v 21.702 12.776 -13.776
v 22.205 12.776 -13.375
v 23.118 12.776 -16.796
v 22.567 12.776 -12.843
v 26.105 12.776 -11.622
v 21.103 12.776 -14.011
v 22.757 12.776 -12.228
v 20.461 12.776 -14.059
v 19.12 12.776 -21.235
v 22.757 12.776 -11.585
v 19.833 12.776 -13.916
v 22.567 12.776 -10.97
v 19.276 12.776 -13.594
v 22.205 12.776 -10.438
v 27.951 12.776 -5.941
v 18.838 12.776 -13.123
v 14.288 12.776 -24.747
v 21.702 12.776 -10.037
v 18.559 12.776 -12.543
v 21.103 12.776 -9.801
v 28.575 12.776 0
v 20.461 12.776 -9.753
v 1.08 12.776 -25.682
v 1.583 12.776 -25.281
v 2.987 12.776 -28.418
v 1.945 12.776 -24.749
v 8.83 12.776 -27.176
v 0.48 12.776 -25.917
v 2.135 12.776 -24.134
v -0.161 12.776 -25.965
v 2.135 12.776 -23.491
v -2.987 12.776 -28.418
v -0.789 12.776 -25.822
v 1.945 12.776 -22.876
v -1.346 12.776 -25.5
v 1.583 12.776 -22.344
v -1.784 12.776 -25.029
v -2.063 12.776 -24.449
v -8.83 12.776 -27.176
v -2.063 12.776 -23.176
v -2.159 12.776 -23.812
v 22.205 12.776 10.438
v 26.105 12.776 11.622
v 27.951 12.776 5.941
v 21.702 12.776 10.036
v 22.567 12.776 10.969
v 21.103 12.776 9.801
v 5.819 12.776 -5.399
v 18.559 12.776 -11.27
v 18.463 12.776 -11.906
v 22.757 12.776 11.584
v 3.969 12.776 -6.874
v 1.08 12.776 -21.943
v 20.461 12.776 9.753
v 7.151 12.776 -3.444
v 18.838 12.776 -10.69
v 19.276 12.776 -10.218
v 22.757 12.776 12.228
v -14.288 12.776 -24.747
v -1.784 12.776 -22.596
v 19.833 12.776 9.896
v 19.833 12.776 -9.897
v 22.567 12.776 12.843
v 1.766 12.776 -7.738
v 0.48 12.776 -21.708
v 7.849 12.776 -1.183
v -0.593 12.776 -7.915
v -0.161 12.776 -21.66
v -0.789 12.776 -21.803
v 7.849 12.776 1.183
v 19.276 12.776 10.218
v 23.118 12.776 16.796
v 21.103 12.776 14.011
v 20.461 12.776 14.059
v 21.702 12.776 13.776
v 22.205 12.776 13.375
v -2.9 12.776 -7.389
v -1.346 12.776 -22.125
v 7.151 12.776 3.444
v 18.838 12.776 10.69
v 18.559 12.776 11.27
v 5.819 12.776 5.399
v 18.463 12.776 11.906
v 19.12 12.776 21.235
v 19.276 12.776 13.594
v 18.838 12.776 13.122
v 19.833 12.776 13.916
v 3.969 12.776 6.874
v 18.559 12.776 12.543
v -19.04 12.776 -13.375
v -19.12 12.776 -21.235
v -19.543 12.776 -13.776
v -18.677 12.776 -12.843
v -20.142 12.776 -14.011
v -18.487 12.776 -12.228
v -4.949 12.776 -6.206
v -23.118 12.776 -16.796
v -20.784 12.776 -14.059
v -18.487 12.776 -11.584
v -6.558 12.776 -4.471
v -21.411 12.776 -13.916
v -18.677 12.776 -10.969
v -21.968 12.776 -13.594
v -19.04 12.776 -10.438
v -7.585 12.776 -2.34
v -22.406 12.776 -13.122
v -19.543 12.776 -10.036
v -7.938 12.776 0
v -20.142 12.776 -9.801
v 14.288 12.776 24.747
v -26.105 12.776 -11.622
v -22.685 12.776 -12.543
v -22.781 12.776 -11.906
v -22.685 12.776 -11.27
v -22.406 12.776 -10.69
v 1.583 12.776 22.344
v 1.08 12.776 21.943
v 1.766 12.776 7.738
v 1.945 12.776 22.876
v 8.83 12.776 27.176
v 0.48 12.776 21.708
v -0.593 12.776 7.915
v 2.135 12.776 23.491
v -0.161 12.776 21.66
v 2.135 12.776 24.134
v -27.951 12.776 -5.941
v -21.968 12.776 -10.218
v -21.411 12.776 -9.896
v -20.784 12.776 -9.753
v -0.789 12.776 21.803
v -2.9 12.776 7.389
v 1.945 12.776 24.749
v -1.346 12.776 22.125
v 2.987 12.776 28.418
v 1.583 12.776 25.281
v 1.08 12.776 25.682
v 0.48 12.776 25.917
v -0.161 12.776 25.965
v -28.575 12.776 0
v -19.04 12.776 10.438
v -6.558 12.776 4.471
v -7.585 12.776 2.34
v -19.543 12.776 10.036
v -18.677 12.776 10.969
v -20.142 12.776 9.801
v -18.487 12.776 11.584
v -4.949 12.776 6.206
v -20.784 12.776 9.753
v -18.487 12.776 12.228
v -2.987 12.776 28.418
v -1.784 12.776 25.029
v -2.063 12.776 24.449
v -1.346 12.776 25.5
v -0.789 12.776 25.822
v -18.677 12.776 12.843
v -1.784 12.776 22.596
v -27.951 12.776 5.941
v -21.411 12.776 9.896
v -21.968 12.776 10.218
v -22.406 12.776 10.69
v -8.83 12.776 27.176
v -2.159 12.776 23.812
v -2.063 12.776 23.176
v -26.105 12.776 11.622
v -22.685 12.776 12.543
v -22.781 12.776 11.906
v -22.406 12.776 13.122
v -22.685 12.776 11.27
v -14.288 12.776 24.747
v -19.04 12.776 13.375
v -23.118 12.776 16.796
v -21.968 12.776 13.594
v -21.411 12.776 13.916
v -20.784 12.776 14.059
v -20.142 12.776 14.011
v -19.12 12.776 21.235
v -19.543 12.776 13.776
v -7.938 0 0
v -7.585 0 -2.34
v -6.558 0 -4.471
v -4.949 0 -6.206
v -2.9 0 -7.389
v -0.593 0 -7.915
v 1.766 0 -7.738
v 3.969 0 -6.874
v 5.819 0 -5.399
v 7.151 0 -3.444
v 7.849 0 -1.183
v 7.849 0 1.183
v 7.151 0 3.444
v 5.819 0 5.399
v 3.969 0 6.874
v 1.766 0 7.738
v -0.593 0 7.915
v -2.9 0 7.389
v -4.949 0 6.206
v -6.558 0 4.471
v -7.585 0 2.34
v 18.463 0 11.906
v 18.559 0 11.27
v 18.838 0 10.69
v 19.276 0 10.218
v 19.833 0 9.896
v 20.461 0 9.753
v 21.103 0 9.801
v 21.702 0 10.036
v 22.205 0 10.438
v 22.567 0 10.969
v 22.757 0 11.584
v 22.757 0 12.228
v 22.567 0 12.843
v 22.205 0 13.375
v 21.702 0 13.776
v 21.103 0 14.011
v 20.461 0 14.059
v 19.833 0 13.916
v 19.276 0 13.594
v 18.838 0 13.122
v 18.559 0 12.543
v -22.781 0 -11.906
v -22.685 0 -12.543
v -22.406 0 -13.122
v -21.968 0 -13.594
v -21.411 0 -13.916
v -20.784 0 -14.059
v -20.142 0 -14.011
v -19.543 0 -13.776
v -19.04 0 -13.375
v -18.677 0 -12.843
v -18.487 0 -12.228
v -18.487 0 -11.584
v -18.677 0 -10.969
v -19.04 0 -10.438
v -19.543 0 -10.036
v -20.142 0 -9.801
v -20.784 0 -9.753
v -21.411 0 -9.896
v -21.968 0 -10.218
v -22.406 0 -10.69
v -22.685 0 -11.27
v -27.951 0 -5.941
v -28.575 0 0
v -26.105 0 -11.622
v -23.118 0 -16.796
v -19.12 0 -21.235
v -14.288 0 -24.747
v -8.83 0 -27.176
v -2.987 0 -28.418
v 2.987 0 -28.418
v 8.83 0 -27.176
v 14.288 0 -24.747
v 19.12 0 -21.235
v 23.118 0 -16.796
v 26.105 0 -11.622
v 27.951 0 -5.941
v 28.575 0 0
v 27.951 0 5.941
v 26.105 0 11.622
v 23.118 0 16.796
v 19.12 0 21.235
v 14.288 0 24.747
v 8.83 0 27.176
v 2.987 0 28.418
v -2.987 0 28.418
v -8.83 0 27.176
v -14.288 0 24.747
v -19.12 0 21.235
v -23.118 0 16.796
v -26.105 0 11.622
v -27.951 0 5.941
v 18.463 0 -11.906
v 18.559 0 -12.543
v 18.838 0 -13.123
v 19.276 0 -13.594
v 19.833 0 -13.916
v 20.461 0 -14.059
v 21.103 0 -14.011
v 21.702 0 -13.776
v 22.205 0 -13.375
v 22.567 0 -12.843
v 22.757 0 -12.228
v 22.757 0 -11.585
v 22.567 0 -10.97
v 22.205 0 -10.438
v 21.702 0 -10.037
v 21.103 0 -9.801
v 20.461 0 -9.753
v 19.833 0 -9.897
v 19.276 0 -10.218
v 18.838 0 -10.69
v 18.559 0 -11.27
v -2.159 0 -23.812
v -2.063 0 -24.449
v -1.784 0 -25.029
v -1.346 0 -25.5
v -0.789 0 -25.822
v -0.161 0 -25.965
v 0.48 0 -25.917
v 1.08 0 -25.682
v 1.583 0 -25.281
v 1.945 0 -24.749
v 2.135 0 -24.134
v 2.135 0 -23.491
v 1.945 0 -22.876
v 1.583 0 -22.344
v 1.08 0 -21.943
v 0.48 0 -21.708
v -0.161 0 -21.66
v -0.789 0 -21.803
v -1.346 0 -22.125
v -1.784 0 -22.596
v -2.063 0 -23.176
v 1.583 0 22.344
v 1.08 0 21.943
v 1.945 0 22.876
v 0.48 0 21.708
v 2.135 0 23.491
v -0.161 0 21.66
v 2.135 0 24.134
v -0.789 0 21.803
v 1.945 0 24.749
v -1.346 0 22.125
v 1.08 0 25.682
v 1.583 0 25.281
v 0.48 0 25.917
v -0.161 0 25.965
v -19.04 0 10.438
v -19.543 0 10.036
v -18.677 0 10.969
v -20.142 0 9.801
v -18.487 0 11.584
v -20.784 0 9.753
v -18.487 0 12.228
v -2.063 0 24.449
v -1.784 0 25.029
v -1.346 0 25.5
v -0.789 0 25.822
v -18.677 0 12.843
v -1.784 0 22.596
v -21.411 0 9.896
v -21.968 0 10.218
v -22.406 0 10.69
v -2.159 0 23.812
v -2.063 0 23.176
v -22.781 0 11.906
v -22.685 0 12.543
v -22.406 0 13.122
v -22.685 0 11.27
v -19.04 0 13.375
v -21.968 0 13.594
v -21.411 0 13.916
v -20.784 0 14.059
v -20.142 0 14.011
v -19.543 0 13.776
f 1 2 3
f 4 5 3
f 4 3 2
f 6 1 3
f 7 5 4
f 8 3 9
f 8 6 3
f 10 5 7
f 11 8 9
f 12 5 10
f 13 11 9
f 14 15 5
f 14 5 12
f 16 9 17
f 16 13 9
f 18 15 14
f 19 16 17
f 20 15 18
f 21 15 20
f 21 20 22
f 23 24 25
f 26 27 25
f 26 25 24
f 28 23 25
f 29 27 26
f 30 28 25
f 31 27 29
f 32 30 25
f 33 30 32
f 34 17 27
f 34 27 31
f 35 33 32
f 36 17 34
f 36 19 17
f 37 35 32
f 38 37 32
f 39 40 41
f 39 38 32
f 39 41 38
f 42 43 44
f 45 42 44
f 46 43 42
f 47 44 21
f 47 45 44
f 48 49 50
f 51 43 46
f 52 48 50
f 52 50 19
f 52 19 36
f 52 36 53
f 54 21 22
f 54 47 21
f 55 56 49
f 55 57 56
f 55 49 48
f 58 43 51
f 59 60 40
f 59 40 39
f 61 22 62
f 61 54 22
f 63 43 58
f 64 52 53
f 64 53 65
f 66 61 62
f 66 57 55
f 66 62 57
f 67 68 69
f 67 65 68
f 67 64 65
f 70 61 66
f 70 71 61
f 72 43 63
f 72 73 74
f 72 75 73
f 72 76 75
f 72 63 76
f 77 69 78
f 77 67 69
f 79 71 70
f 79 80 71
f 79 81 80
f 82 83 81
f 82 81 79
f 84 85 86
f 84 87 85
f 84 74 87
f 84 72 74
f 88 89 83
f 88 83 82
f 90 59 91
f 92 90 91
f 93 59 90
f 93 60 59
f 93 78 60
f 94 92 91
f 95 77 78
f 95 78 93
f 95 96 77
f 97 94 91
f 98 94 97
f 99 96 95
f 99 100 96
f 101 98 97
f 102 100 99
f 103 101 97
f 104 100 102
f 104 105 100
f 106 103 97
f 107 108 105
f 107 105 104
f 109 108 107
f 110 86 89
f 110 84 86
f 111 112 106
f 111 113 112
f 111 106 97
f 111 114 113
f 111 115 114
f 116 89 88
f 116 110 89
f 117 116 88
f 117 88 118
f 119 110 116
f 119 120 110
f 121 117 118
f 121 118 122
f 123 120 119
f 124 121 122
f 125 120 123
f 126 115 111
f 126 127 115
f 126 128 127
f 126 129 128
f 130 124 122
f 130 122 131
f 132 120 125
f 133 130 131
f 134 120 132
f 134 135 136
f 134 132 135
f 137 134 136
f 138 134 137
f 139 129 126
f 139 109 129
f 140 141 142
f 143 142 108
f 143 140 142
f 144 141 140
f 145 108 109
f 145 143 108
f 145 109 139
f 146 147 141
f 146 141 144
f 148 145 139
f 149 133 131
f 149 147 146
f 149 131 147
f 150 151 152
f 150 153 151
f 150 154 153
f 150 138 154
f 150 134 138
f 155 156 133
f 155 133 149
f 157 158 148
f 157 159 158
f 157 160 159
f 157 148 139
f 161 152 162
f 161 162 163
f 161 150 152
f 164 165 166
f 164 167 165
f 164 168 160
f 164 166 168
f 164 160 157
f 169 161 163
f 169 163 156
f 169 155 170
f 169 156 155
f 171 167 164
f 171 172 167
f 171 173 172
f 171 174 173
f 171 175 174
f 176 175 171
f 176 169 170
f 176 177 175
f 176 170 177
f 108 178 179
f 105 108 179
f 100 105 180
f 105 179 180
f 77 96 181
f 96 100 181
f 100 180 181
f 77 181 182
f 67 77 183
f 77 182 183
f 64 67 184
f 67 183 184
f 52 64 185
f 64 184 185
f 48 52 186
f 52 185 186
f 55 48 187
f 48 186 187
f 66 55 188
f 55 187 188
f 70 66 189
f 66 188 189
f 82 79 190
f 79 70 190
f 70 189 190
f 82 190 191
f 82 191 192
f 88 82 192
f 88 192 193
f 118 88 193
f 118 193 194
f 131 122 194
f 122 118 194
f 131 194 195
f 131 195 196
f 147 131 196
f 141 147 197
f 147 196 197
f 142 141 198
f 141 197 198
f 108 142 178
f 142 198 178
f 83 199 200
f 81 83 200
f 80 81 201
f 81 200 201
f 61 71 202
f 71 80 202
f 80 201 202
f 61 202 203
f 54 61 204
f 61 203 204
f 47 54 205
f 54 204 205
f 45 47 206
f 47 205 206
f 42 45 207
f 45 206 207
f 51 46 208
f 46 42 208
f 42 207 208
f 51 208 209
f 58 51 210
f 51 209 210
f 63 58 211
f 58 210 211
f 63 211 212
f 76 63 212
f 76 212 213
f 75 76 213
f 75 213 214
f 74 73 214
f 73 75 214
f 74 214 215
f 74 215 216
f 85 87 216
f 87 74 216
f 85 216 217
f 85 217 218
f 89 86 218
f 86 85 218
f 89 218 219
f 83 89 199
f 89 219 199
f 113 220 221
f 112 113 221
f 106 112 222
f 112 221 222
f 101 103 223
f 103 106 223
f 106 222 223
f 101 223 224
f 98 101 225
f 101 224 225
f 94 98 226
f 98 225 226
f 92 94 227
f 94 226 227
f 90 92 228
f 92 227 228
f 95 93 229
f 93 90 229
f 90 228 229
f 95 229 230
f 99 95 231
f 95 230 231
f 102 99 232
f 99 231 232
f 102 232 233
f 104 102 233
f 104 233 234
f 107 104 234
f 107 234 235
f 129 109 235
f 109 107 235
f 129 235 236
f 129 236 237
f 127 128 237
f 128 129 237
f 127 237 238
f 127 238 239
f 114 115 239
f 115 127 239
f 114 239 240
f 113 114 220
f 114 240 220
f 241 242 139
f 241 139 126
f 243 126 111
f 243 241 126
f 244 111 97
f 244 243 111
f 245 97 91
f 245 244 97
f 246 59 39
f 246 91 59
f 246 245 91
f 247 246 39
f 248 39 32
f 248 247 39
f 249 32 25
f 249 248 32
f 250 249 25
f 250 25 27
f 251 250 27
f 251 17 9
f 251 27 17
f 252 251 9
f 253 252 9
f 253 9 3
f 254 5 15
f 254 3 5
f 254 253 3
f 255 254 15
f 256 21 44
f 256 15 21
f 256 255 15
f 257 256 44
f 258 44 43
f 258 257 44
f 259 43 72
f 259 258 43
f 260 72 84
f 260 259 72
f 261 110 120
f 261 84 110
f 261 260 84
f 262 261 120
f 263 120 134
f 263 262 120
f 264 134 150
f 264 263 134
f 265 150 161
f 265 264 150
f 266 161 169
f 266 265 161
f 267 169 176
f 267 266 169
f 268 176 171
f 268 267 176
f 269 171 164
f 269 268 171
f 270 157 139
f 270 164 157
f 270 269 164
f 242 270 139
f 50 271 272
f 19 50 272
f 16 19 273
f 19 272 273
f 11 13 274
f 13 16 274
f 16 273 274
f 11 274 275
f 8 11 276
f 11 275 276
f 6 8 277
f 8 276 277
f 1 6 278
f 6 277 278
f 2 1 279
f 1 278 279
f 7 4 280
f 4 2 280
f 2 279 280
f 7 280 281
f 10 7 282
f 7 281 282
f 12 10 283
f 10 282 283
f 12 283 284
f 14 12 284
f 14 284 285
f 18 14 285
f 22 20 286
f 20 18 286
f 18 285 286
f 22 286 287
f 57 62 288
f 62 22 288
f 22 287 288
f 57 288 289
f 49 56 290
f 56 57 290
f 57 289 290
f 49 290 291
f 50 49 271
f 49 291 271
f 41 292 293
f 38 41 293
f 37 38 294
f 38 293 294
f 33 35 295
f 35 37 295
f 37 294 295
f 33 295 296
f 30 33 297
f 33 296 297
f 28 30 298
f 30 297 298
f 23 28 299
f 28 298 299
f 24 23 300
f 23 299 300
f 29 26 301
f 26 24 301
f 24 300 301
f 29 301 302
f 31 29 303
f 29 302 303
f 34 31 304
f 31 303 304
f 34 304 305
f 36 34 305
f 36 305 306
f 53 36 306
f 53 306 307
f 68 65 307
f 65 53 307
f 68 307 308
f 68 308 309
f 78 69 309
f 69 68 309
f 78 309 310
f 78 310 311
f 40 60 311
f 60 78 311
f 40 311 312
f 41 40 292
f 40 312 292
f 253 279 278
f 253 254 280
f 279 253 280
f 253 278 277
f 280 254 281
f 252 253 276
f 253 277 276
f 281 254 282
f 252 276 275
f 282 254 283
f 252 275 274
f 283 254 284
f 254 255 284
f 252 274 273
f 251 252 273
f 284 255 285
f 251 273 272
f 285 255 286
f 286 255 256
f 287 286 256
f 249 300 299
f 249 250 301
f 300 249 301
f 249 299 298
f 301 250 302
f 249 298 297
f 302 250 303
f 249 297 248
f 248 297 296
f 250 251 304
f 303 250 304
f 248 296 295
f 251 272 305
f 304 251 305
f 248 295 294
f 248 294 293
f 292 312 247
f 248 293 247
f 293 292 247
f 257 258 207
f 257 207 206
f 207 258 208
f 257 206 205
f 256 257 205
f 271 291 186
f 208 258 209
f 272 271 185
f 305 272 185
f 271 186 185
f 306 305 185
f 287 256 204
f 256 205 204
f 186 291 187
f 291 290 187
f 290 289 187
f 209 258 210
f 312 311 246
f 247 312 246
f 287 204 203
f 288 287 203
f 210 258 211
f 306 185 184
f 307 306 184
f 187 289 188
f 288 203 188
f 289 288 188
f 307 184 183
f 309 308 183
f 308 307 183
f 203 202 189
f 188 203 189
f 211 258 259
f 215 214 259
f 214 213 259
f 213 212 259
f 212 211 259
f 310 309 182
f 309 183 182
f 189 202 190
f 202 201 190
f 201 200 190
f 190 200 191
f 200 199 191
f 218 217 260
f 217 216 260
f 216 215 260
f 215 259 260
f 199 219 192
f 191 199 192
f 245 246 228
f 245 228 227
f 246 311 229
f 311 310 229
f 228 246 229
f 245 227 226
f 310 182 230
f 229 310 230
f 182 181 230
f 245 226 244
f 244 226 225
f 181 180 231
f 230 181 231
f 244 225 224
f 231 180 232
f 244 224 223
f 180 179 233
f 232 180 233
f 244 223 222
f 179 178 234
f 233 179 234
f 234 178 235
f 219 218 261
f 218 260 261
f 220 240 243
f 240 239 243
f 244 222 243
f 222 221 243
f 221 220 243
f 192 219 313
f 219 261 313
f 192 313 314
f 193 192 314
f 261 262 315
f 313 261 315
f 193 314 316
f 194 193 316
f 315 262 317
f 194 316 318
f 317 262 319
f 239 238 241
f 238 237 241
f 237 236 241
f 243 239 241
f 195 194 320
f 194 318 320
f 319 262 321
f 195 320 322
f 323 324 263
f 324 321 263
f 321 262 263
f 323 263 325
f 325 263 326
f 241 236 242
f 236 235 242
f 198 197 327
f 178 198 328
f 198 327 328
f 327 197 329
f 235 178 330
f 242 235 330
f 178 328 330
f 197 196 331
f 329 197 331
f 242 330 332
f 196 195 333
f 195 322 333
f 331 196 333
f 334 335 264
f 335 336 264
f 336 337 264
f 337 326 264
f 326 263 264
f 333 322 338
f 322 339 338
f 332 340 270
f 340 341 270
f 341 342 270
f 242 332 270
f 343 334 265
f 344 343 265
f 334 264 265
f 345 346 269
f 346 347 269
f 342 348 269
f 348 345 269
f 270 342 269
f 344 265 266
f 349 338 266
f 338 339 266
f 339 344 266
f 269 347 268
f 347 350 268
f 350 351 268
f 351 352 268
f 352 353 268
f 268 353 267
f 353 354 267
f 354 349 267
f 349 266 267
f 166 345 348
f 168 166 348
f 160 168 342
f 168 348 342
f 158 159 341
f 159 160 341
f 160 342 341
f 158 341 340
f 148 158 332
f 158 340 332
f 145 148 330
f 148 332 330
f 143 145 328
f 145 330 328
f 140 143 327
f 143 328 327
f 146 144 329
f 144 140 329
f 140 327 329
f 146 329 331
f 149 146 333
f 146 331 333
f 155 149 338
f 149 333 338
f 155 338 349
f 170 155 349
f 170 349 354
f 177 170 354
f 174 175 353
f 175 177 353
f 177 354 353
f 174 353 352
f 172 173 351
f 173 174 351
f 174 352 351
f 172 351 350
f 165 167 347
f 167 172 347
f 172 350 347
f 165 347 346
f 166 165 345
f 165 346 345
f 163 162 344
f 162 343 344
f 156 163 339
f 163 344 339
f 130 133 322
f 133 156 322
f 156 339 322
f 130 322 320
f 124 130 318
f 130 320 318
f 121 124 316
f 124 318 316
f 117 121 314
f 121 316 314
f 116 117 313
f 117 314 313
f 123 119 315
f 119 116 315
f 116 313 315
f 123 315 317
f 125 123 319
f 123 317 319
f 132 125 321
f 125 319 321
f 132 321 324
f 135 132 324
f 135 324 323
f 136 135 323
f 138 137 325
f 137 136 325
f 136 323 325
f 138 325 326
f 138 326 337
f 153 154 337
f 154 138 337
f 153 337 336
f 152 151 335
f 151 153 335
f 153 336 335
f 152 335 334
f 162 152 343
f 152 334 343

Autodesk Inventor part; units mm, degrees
ref_plane "YZ Plane" through (0, 0, 0) normal (1, 0, 0) x (0, 1, 0)
ref_plane "XZ Plane" through (0, 0, 0) normal (0, 1, 0) x (-1, 0, 0)
ref_plane "XY Plane" through (0, 0, 0) normal (0, 0, 1) x (1, 0, 0)
sketch "Sketch1" plane through (0, 0, 0) normal (0, 1, 0) x (-1, 0, 0)
  circle A0 centre (0, 0) radius 23.8125 construction
  circle A1 centre (0, 23.8125) radius 2.159
  line L0 (0, 0) -> (0, 23.8125) construction
  line L1 (0, 23.8125) -> (20.6222, 11.9062) construction
  line L2 (20.6222, 11.9062) -> (20.6222, -11.9062) construction
  line L3 (20.6222, -11.9062) -> (0, -23.8125) construction
  line L4 (0, -23.8125) -> (-20.6222, -11.9063) construction
  line L5 (-20.6222, -11.9063) -> (-20.6222, 11.9062) construction
  line L6 (-20.6222, 11.9062) -> (0, 23.8125) construction
  circle A2 centre (-20.6222, 11.9062) radius 2.159
  circle A3 centre (-20.6222, -11.9063) radius 2.159
  circle A4 centre (0, -23.8125) radius 2.159
  circle A5 centre (20.6222, -11.9062) radius 2.159
  circle A6 centre (20.6222, 11.9062) radius 2.159
  circle A7 centre (0, 0) radius 28.575
  circle A8 centre (0, 0) radius 7.9375
  dimension "d0" = 47.625
  dimension "d1" = 4.318
  dimension "d2" = 4.318
  dimension "d3" = 4.318
  dimension "d4" = 4.318
  dimension "d5" = 4.318
  dimension "d6" = 4.318
  dimension "d7" = 57.15
  dimension "d10" = 15.875
extrude "Extrusion2" add sketch "Sketch1" along normal blind 12.7762
properties part number "spacer" material "Aluminum 6061"
